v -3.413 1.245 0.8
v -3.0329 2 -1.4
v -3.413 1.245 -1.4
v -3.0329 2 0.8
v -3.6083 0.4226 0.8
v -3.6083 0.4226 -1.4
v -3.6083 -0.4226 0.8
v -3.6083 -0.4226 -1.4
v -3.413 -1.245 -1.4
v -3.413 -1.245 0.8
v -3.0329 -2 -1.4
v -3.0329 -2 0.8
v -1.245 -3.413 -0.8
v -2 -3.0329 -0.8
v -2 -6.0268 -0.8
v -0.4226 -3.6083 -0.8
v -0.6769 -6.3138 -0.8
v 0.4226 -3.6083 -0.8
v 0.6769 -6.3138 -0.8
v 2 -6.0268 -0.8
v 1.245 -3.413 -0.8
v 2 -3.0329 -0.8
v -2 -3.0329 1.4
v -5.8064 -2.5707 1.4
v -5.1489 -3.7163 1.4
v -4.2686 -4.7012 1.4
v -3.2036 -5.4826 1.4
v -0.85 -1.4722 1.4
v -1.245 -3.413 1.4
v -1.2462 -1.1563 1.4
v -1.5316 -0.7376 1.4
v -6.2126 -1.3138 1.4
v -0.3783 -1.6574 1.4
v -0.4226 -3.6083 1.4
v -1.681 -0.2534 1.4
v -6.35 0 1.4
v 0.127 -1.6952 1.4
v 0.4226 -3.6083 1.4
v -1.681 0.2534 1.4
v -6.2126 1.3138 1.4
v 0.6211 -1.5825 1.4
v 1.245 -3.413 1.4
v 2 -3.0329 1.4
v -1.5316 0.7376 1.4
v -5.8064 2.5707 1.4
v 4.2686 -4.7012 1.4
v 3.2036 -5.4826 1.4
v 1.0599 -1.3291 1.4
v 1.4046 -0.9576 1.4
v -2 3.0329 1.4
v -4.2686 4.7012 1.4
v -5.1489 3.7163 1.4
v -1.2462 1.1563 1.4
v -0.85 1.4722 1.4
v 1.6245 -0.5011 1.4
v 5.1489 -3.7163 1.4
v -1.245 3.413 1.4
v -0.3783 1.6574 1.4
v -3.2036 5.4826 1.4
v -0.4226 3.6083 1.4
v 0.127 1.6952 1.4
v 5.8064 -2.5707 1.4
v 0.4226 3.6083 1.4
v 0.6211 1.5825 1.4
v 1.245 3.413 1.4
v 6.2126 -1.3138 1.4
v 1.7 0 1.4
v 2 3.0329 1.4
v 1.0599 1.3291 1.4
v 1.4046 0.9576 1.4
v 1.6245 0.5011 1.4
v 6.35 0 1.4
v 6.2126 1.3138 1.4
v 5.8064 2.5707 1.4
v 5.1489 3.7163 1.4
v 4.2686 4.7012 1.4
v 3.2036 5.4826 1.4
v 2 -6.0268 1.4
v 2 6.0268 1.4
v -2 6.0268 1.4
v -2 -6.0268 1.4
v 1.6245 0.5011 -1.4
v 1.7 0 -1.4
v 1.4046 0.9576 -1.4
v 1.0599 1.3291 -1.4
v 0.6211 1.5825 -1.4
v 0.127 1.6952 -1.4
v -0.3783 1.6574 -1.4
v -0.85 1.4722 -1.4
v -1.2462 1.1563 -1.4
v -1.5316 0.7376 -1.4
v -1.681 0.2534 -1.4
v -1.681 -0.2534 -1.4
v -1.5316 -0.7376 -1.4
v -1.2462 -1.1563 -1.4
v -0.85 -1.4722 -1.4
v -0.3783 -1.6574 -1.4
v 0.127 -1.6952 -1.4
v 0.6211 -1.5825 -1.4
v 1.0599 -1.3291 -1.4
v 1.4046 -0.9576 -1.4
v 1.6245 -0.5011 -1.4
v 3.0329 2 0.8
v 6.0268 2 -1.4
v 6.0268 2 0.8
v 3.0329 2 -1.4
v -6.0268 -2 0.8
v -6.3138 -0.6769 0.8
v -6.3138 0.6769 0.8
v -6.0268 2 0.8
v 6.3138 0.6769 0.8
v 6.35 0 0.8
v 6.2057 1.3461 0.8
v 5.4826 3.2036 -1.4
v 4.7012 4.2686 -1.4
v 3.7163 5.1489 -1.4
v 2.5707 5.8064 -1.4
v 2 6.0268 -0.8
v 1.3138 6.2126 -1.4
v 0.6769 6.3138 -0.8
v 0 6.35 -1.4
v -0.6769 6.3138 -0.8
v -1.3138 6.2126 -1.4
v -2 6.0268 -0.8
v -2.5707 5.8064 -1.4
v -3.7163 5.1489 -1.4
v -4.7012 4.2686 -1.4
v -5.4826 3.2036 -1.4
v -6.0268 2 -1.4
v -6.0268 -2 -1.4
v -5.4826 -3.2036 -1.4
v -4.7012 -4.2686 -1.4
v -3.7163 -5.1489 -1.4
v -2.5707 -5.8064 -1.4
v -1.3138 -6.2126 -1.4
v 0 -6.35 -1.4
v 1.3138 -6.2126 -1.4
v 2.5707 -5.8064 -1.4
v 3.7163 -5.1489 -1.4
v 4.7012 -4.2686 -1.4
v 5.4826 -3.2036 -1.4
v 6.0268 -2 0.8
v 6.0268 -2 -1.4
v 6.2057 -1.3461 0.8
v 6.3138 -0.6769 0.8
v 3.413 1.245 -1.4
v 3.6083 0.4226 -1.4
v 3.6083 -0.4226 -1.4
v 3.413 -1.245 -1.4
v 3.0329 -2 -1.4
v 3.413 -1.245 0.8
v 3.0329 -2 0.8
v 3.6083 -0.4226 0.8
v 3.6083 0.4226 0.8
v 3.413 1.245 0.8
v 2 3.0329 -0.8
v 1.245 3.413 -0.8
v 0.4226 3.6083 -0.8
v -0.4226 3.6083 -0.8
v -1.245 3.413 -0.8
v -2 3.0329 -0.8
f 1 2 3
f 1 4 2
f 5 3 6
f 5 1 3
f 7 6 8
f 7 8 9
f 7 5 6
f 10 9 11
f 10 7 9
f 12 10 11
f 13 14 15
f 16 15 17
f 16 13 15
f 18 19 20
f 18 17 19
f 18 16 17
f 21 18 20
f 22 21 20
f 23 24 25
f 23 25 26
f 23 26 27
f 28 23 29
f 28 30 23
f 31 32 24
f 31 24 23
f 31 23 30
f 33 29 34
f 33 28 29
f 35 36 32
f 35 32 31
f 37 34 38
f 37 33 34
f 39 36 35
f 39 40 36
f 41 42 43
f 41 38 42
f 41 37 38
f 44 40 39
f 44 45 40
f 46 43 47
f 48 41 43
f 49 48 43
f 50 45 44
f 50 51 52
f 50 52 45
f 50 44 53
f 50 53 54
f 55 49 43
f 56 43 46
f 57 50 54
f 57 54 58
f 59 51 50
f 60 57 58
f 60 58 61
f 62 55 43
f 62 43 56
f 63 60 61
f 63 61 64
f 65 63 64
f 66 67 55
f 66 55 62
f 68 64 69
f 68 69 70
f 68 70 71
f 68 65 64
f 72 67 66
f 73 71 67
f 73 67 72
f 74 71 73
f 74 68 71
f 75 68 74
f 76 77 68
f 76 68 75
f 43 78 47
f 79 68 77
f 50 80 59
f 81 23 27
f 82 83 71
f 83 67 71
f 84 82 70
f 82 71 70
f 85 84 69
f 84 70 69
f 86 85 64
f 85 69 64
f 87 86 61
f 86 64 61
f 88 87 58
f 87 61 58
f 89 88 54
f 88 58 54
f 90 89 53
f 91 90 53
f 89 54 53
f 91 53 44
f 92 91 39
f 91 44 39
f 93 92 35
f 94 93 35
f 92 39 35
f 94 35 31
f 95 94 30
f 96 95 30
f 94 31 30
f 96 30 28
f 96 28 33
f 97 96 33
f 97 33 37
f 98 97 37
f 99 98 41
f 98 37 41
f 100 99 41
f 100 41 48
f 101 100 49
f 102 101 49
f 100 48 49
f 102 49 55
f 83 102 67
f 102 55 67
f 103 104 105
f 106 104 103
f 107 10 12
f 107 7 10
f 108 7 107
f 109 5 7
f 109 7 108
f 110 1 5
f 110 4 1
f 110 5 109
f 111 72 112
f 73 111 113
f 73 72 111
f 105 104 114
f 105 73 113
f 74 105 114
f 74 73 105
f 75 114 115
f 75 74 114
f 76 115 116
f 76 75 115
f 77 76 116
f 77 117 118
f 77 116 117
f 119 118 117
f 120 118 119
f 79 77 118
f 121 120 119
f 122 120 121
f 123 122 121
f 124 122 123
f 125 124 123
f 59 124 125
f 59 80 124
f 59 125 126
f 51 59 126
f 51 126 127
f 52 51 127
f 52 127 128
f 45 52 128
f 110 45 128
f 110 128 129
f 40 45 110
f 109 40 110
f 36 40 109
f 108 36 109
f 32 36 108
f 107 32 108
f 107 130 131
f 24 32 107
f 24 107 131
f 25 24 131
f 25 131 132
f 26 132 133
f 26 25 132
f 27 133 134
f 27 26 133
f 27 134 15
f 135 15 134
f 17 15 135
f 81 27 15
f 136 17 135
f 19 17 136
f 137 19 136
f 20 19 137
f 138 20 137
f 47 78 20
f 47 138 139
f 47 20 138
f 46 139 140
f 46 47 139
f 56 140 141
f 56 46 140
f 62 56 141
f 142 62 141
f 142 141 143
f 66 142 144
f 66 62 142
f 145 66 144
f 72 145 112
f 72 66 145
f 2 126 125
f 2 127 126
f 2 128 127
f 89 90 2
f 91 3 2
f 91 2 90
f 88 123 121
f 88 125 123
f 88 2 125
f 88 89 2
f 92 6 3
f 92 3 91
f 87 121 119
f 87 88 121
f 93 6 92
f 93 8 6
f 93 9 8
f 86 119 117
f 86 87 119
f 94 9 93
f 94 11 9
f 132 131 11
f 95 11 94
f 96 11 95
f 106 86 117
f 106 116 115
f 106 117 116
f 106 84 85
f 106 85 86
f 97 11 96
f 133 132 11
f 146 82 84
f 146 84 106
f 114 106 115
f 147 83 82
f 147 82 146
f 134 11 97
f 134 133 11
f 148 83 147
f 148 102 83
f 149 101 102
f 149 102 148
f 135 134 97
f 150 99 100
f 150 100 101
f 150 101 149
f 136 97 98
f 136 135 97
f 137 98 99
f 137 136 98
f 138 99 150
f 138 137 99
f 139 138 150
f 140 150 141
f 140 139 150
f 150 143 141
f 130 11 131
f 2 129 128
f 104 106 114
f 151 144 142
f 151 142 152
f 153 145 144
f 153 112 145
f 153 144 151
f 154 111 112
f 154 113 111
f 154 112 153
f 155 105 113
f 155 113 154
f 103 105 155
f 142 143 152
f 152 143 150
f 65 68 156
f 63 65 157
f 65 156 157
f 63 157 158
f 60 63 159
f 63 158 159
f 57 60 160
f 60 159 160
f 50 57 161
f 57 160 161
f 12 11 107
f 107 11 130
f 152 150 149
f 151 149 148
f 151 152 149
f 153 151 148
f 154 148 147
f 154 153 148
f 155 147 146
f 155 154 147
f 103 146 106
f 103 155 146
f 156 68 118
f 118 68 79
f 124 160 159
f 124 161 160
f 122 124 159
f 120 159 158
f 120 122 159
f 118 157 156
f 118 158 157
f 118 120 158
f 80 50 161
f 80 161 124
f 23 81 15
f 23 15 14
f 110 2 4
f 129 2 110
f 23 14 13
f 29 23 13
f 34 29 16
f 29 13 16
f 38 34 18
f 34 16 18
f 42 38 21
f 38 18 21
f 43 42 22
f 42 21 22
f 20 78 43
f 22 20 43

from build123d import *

# Parameters (mm, degrees)
SKETCH1_R                       = 6.35
BOSS_EXTRUDE1_DEPTH             = 1.4
SKETCH2_W                       = 4
SKETCH2_H                       = 12.7
CUT_EXTRUDE1_DEPTH              = 2.2
SKETCH3_W                       = 12.7
SKETCH3_H                       = 4
CUT_EXTRUDE2_DEPTH              = 2.2
BOSS_EXTRUDE2_REACH             = 11.246
SKETCH9_R                       = 3.633
SKETCH9_R_2                     = 1.7
BOSS_EXTRUDE2_DIRECTION_2_REACH = 11.246


with BuildPart() as part:
    # Sketch1 → Boss-Extrude1 (new, symmetric)
    with BuildSketch(Plane.XY):
        Circle(SKETCH1_R)
    extrude(amount=BOSS_EXTRUDE1_DEPTH, both=True)

    # Sketch2 → Cut-Extrude1 (cut)
    with BuildSketch(Plane.XY.offset(1.4)):
        Rectangle(SKETCH2_W, SKETCH2_H)
    extrude(amount=-CUT_EXTRUDE1_DEPTH, mode=Mode.SUBTRACT)

    # Sketch3 → Cut-Extrude2 (cut)
    with BuildSketch(Plane(origin=(0, 0, -1.4), x_dir=(-1, 0, 0), z_dir=(0, 0, -1))):
        Rectangle(SKETCH3_W, SKETCH3_H)
    extrude(amount=-CUT_EXTRUDE2_DEPTH, mode=Mode.SUBTRACT)

    # Boss-Extrude2: up to this face of the body (flat: up to its plane)
    boss_extrude2_end = Plane(part.part.faces().sort_by_distance((-3.803983963, 0, 1.4))[0])
    # Sketch9 → Boss-Extrude2 (add, up to the picked face)
    with BuildSketch(Plane.XY.offset(-0.8), mode=Mode.PRIVATE) as boss_extrude2_sk1:
        Circle(SKETCH9_R)
        Circle(SKETCH9_R_2, mode=Mode.SUBTRACT)
    boss_extrude2_tool1 = split(extrude(boss_extrude2_sk1.sketch, amount=BOSS_EXTRUDE2_REACH, mode=Mode.PRIVATE), bisect_by=boss_extrude2_end, keep=Keep.BOTH, mode=Mode.PRIVATE)
    add(boss_extrude2_tool1.solids().sort_by(Axis((-3.530243, 0, -0.8), (0, 0, 1)))[0])

    # Boss-Extrude2 direction 2: up to this face of the body (flat: up to its plane)
    boss_extrude2_direction_2_end = Plane(part.part.faces().sort_by_distance((0, 3.803983963, -1.4))[0])
    # Sketch9 → Boss-Extrude2 direction 2 (add, up to the picked face)
    with BuildSketch(Plane.XY.offset(-0.8), mode=Mode.PRIVATE) as boss_extrude2_direction_2_sk1:
        Circle(SKETCH9_R)
        Circle(SKETCH9_R_2, mode=Mode.SUBTRACT)
    boss_extrude2_direction_2_tool1 = split(extrude(boss_extrude2_direction_2_sk1.sketch, amount=-BOSS_EXTRUDE2_DIRECTION_2_REACH, mode=Mode.PRIVATE), bisect_by=boss_extrude2_direction_2_end, keep=Keep.BOTH, mode=Mode.PRIVATE)
    add(boss_extrude2_direction_2_tool1.solids().sort_by(Axis((-3.530243, 0, -0.8), (0, 0, -1)))[0])


solid = part.part
